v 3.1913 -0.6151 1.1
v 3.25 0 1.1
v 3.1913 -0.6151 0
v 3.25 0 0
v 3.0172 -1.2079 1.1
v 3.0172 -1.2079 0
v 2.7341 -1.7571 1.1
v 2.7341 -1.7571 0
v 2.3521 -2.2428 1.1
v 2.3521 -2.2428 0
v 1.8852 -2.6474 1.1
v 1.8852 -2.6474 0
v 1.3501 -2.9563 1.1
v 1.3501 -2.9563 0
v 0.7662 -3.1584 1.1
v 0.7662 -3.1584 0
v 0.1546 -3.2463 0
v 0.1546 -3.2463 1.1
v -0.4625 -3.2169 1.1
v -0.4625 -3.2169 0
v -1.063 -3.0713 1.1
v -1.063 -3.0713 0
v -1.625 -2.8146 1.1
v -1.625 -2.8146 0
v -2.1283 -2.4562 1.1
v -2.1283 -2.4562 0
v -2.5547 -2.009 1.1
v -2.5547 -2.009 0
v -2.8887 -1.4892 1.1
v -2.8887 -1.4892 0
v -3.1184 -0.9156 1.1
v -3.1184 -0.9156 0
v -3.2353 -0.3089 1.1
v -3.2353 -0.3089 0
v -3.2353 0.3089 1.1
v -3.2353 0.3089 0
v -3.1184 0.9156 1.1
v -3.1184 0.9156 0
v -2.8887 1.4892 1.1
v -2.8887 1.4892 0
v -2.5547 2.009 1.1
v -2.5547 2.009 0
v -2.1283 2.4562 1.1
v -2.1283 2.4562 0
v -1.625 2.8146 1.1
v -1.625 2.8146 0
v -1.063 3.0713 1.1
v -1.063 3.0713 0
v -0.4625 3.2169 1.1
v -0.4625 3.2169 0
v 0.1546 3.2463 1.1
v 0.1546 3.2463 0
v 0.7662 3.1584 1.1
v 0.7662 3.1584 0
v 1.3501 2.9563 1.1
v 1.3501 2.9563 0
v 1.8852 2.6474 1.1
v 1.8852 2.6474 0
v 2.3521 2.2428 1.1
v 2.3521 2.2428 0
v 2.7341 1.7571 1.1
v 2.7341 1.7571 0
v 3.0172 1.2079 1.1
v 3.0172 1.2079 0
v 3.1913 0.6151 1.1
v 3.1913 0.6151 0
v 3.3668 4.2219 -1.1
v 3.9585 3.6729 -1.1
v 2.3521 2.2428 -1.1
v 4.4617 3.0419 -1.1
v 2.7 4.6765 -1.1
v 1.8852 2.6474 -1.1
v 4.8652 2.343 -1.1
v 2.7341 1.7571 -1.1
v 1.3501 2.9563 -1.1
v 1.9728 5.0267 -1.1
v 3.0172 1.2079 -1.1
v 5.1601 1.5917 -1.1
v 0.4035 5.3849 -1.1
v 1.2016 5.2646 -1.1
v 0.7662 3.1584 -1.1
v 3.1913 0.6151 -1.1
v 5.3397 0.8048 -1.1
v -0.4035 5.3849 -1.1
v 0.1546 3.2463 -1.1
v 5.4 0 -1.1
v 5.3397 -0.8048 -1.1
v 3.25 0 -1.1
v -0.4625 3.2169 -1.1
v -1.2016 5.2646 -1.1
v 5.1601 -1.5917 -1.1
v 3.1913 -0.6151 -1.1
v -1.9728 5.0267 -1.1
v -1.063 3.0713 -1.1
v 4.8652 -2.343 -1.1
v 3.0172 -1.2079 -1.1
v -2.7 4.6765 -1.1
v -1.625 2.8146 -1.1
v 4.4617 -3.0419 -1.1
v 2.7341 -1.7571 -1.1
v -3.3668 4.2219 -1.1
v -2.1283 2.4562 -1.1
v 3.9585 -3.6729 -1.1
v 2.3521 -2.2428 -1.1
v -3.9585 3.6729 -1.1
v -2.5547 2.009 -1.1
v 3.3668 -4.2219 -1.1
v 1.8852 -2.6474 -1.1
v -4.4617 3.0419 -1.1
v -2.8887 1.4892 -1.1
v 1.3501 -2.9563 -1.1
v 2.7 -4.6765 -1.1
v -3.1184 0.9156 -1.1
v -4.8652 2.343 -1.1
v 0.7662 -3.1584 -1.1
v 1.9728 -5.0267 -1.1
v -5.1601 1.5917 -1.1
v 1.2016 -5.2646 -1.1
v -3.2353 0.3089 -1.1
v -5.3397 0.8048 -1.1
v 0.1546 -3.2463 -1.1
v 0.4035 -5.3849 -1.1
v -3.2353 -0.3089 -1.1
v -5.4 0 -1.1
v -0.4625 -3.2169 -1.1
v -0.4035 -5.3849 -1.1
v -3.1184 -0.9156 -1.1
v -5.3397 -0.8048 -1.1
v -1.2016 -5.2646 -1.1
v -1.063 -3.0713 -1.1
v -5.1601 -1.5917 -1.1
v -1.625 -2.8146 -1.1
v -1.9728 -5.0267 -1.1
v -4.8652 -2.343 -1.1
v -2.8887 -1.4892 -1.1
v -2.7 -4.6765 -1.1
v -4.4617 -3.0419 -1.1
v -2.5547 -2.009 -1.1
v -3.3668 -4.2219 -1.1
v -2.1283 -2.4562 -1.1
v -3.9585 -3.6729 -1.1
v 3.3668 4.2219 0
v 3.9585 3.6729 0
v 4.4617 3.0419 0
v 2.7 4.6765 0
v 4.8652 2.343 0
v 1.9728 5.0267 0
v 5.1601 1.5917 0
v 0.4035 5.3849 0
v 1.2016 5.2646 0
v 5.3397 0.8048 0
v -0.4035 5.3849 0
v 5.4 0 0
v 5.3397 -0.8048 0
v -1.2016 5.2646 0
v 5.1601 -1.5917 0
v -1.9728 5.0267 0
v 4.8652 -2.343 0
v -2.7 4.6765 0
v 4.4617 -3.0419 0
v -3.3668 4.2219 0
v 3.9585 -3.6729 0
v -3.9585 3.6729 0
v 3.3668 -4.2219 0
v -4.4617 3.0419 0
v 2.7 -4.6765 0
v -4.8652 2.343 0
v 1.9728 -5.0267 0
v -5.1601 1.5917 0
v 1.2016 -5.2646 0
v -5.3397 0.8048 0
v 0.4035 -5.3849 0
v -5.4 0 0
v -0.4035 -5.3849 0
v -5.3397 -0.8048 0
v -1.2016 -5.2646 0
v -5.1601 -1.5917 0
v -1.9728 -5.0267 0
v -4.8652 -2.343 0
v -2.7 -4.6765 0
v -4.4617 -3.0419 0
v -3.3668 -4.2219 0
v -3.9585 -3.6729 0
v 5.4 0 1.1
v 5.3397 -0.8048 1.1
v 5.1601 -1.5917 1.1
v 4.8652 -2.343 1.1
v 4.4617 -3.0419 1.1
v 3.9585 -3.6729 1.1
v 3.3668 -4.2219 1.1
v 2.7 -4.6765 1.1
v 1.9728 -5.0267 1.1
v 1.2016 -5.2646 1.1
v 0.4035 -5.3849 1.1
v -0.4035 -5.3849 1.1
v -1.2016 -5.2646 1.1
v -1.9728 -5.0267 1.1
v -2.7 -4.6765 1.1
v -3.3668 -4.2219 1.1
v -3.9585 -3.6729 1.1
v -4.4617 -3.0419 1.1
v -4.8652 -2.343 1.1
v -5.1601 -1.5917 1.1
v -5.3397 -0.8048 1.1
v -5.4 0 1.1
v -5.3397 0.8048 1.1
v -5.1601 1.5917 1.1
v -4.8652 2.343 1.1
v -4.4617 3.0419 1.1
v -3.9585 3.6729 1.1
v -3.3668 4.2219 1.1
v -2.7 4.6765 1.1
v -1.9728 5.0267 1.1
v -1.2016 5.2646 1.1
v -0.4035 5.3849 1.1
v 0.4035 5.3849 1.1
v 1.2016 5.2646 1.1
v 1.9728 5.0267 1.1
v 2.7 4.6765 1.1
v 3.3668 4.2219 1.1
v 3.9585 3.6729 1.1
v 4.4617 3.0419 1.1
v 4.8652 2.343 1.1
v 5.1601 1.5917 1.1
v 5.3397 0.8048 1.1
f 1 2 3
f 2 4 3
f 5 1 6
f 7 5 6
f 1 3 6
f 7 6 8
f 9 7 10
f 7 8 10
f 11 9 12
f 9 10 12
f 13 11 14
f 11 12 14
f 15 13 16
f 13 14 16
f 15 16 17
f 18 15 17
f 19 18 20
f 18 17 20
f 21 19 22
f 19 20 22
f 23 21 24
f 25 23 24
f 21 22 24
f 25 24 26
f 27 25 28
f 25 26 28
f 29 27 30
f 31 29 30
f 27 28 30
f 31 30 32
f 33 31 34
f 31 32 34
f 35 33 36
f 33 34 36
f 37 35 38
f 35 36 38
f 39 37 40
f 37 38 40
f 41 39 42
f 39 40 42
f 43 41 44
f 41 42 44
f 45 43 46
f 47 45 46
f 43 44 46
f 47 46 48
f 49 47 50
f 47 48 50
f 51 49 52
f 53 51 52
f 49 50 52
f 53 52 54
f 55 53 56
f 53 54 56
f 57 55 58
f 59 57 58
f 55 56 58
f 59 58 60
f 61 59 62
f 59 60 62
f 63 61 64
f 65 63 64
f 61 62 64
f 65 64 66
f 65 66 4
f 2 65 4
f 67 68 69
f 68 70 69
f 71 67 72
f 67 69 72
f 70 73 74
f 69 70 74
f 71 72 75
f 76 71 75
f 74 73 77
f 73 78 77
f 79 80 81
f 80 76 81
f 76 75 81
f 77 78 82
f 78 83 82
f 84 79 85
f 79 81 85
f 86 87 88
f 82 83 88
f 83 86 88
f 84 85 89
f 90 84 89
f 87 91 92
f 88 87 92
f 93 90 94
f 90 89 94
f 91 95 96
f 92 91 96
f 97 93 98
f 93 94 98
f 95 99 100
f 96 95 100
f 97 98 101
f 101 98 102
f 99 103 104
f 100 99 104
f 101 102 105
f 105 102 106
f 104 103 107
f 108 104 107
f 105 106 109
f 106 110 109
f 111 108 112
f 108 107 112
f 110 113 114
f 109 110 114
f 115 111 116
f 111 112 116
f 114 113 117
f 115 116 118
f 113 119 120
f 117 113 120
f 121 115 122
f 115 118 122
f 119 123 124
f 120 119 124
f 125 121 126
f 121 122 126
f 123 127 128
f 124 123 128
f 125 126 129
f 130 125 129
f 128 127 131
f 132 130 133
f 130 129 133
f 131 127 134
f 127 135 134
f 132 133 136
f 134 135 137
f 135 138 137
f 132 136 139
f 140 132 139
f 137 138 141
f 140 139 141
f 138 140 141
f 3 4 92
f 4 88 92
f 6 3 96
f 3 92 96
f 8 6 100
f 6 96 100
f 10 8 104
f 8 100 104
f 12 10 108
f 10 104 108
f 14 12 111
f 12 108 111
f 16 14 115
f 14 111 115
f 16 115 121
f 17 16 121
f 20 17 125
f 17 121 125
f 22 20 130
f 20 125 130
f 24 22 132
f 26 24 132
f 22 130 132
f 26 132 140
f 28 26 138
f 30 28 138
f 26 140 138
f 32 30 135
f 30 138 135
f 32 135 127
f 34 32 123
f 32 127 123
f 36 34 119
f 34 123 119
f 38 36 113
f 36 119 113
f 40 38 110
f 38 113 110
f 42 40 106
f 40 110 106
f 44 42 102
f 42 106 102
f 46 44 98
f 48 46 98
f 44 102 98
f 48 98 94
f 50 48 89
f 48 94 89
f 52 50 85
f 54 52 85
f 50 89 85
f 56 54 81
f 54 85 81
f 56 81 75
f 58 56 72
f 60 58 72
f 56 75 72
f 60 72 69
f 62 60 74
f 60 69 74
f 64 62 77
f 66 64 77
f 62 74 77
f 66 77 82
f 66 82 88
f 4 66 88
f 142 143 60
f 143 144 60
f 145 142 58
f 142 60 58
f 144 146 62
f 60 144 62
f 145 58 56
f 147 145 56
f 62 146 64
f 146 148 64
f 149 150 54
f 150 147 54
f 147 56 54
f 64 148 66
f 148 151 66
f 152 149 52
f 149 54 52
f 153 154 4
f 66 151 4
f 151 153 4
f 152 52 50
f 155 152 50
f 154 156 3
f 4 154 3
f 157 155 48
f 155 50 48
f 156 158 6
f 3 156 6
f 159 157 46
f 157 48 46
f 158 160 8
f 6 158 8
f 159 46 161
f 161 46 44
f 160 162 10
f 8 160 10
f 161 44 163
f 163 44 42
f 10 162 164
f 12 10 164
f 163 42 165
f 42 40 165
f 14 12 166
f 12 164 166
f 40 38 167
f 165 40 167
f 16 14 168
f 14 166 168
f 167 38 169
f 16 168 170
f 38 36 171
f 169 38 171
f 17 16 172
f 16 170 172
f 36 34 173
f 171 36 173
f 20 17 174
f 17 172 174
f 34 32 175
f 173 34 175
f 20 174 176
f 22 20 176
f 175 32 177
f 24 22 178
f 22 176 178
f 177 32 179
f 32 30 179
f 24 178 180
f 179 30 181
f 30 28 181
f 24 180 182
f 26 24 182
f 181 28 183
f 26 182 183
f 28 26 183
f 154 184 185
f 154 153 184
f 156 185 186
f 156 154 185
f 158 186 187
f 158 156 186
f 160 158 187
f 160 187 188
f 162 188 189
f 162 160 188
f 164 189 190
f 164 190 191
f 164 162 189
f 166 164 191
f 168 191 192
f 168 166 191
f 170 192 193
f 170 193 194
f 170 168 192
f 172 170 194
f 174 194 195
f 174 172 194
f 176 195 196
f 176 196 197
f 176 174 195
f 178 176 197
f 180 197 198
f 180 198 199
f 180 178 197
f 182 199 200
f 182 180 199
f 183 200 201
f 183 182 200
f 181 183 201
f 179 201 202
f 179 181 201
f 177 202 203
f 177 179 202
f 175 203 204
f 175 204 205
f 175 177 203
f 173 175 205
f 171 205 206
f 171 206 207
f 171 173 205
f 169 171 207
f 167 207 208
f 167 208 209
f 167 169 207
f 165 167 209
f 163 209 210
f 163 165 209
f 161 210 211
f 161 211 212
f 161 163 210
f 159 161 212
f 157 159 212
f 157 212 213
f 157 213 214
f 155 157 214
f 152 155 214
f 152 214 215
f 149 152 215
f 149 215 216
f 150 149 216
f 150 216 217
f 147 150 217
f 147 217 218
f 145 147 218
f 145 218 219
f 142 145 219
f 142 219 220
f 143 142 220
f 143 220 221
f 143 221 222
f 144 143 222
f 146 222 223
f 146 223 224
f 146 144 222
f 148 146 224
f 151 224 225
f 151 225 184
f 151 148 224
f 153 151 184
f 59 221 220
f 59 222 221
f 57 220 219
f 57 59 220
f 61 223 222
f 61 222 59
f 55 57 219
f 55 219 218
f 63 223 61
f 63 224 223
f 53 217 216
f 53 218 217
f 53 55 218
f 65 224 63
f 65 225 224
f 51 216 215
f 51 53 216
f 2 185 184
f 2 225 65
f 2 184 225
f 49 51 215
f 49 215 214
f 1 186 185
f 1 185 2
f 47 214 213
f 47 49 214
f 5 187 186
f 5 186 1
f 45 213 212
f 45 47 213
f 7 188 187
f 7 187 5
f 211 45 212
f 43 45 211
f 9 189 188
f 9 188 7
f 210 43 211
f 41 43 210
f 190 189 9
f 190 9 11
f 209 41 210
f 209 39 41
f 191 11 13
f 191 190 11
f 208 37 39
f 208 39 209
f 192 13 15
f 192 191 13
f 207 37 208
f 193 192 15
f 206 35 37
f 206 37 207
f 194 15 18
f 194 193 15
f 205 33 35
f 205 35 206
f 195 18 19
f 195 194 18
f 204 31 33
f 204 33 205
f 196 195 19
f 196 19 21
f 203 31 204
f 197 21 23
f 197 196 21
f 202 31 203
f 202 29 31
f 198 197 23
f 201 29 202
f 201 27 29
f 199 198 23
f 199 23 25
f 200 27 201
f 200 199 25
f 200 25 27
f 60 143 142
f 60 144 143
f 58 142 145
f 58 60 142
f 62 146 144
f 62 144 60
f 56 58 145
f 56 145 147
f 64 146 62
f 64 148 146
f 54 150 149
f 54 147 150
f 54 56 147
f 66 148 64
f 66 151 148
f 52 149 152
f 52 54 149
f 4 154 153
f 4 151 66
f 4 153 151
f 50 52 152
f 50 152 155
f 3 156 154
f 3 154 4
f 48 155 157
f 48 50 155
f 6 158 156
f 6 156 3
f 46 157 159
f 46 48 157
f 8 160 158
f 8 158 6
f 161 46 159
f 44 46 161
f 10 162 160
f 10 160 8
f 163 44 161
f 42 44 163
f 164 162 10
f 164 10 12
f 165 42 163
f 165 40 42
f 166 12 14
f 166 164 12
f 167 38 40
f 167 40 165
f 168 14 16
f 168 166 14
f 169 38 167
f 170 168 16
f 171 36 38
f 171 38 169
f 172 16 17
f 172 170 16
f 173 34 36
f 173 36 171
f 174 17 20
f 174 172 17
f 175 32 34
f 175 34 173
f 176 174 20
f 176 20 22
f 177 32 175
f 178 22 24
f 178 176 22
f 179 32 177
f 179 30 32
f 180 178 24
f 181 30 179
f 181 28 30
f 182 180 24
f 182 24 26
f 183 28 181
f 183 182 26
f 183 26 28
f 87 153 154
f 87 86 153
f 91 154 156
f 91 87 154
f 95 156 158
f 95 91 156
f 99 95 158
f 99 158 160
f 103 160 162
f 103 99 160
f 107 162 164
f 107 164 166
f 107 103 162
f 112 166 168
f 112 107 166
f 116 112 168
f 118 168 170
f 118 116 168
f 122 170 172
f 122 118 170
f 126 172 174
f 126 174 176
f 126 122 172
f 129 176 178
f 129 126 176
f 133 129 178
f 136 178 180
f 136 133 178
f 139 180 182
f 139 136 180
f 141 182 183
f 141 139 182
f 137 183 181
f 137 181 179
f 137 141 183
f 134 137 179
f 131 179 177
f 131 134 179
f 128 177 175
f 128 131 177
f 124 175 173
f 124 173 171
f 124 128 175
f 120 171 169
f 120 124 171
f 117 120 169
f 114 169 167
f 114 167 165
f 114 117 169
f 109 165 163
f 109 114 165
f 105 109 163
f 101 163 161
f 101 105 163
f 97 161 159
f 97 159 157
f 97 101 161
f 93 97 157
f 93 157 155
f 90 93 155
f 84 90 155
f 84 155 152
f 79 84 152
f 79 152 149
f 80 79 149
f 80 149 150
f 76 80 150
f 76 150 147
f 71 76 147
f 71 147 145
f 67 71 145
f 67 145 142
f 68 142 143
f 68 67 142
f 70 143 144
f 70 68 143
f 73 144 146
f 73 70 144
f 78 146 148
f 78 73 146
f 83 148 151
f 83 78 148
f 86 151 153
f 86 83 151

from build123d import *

# Parameters (mm, degrees)
SKETCH_8_W   = 1.1
SKETCH_8_H   = 2.15
SKETCH_8_8_W = 1.1
SKETCH_8_8_H = 2.15


with BuildPart() as part:
    # 草图8 → 旋转3 (revolve)
    with BuildSketch(Plane(origin=(0, 0, 0), x_dir=(0, 0, -1), z_dir=(1, 0, 0))):
        with Locations((-0.55, 4.325)):
            Rectangle(SKETCH_8_W, SKETCH_8_H)
    revolve(axis=Axis((0, 0, 0), (0, 0, -1)))


with BuildPart() as body_2:
    # 草图8<8> → 旋转4 (revolve)
    with BuildSketch(Plane(origin=(0, 0, 0), x_dir=(0, 0, -1), z_dir=(1, 0, 0))):
        with Locations((0.55, 4.325)):
            Rectangle(SKETCH_8_8_W, SKETCH_8_8_H)
    revolve(axis=Axis((0, 0, 0), (0, 0, -1)))


solid = Compound([part.part, body_2.part])
